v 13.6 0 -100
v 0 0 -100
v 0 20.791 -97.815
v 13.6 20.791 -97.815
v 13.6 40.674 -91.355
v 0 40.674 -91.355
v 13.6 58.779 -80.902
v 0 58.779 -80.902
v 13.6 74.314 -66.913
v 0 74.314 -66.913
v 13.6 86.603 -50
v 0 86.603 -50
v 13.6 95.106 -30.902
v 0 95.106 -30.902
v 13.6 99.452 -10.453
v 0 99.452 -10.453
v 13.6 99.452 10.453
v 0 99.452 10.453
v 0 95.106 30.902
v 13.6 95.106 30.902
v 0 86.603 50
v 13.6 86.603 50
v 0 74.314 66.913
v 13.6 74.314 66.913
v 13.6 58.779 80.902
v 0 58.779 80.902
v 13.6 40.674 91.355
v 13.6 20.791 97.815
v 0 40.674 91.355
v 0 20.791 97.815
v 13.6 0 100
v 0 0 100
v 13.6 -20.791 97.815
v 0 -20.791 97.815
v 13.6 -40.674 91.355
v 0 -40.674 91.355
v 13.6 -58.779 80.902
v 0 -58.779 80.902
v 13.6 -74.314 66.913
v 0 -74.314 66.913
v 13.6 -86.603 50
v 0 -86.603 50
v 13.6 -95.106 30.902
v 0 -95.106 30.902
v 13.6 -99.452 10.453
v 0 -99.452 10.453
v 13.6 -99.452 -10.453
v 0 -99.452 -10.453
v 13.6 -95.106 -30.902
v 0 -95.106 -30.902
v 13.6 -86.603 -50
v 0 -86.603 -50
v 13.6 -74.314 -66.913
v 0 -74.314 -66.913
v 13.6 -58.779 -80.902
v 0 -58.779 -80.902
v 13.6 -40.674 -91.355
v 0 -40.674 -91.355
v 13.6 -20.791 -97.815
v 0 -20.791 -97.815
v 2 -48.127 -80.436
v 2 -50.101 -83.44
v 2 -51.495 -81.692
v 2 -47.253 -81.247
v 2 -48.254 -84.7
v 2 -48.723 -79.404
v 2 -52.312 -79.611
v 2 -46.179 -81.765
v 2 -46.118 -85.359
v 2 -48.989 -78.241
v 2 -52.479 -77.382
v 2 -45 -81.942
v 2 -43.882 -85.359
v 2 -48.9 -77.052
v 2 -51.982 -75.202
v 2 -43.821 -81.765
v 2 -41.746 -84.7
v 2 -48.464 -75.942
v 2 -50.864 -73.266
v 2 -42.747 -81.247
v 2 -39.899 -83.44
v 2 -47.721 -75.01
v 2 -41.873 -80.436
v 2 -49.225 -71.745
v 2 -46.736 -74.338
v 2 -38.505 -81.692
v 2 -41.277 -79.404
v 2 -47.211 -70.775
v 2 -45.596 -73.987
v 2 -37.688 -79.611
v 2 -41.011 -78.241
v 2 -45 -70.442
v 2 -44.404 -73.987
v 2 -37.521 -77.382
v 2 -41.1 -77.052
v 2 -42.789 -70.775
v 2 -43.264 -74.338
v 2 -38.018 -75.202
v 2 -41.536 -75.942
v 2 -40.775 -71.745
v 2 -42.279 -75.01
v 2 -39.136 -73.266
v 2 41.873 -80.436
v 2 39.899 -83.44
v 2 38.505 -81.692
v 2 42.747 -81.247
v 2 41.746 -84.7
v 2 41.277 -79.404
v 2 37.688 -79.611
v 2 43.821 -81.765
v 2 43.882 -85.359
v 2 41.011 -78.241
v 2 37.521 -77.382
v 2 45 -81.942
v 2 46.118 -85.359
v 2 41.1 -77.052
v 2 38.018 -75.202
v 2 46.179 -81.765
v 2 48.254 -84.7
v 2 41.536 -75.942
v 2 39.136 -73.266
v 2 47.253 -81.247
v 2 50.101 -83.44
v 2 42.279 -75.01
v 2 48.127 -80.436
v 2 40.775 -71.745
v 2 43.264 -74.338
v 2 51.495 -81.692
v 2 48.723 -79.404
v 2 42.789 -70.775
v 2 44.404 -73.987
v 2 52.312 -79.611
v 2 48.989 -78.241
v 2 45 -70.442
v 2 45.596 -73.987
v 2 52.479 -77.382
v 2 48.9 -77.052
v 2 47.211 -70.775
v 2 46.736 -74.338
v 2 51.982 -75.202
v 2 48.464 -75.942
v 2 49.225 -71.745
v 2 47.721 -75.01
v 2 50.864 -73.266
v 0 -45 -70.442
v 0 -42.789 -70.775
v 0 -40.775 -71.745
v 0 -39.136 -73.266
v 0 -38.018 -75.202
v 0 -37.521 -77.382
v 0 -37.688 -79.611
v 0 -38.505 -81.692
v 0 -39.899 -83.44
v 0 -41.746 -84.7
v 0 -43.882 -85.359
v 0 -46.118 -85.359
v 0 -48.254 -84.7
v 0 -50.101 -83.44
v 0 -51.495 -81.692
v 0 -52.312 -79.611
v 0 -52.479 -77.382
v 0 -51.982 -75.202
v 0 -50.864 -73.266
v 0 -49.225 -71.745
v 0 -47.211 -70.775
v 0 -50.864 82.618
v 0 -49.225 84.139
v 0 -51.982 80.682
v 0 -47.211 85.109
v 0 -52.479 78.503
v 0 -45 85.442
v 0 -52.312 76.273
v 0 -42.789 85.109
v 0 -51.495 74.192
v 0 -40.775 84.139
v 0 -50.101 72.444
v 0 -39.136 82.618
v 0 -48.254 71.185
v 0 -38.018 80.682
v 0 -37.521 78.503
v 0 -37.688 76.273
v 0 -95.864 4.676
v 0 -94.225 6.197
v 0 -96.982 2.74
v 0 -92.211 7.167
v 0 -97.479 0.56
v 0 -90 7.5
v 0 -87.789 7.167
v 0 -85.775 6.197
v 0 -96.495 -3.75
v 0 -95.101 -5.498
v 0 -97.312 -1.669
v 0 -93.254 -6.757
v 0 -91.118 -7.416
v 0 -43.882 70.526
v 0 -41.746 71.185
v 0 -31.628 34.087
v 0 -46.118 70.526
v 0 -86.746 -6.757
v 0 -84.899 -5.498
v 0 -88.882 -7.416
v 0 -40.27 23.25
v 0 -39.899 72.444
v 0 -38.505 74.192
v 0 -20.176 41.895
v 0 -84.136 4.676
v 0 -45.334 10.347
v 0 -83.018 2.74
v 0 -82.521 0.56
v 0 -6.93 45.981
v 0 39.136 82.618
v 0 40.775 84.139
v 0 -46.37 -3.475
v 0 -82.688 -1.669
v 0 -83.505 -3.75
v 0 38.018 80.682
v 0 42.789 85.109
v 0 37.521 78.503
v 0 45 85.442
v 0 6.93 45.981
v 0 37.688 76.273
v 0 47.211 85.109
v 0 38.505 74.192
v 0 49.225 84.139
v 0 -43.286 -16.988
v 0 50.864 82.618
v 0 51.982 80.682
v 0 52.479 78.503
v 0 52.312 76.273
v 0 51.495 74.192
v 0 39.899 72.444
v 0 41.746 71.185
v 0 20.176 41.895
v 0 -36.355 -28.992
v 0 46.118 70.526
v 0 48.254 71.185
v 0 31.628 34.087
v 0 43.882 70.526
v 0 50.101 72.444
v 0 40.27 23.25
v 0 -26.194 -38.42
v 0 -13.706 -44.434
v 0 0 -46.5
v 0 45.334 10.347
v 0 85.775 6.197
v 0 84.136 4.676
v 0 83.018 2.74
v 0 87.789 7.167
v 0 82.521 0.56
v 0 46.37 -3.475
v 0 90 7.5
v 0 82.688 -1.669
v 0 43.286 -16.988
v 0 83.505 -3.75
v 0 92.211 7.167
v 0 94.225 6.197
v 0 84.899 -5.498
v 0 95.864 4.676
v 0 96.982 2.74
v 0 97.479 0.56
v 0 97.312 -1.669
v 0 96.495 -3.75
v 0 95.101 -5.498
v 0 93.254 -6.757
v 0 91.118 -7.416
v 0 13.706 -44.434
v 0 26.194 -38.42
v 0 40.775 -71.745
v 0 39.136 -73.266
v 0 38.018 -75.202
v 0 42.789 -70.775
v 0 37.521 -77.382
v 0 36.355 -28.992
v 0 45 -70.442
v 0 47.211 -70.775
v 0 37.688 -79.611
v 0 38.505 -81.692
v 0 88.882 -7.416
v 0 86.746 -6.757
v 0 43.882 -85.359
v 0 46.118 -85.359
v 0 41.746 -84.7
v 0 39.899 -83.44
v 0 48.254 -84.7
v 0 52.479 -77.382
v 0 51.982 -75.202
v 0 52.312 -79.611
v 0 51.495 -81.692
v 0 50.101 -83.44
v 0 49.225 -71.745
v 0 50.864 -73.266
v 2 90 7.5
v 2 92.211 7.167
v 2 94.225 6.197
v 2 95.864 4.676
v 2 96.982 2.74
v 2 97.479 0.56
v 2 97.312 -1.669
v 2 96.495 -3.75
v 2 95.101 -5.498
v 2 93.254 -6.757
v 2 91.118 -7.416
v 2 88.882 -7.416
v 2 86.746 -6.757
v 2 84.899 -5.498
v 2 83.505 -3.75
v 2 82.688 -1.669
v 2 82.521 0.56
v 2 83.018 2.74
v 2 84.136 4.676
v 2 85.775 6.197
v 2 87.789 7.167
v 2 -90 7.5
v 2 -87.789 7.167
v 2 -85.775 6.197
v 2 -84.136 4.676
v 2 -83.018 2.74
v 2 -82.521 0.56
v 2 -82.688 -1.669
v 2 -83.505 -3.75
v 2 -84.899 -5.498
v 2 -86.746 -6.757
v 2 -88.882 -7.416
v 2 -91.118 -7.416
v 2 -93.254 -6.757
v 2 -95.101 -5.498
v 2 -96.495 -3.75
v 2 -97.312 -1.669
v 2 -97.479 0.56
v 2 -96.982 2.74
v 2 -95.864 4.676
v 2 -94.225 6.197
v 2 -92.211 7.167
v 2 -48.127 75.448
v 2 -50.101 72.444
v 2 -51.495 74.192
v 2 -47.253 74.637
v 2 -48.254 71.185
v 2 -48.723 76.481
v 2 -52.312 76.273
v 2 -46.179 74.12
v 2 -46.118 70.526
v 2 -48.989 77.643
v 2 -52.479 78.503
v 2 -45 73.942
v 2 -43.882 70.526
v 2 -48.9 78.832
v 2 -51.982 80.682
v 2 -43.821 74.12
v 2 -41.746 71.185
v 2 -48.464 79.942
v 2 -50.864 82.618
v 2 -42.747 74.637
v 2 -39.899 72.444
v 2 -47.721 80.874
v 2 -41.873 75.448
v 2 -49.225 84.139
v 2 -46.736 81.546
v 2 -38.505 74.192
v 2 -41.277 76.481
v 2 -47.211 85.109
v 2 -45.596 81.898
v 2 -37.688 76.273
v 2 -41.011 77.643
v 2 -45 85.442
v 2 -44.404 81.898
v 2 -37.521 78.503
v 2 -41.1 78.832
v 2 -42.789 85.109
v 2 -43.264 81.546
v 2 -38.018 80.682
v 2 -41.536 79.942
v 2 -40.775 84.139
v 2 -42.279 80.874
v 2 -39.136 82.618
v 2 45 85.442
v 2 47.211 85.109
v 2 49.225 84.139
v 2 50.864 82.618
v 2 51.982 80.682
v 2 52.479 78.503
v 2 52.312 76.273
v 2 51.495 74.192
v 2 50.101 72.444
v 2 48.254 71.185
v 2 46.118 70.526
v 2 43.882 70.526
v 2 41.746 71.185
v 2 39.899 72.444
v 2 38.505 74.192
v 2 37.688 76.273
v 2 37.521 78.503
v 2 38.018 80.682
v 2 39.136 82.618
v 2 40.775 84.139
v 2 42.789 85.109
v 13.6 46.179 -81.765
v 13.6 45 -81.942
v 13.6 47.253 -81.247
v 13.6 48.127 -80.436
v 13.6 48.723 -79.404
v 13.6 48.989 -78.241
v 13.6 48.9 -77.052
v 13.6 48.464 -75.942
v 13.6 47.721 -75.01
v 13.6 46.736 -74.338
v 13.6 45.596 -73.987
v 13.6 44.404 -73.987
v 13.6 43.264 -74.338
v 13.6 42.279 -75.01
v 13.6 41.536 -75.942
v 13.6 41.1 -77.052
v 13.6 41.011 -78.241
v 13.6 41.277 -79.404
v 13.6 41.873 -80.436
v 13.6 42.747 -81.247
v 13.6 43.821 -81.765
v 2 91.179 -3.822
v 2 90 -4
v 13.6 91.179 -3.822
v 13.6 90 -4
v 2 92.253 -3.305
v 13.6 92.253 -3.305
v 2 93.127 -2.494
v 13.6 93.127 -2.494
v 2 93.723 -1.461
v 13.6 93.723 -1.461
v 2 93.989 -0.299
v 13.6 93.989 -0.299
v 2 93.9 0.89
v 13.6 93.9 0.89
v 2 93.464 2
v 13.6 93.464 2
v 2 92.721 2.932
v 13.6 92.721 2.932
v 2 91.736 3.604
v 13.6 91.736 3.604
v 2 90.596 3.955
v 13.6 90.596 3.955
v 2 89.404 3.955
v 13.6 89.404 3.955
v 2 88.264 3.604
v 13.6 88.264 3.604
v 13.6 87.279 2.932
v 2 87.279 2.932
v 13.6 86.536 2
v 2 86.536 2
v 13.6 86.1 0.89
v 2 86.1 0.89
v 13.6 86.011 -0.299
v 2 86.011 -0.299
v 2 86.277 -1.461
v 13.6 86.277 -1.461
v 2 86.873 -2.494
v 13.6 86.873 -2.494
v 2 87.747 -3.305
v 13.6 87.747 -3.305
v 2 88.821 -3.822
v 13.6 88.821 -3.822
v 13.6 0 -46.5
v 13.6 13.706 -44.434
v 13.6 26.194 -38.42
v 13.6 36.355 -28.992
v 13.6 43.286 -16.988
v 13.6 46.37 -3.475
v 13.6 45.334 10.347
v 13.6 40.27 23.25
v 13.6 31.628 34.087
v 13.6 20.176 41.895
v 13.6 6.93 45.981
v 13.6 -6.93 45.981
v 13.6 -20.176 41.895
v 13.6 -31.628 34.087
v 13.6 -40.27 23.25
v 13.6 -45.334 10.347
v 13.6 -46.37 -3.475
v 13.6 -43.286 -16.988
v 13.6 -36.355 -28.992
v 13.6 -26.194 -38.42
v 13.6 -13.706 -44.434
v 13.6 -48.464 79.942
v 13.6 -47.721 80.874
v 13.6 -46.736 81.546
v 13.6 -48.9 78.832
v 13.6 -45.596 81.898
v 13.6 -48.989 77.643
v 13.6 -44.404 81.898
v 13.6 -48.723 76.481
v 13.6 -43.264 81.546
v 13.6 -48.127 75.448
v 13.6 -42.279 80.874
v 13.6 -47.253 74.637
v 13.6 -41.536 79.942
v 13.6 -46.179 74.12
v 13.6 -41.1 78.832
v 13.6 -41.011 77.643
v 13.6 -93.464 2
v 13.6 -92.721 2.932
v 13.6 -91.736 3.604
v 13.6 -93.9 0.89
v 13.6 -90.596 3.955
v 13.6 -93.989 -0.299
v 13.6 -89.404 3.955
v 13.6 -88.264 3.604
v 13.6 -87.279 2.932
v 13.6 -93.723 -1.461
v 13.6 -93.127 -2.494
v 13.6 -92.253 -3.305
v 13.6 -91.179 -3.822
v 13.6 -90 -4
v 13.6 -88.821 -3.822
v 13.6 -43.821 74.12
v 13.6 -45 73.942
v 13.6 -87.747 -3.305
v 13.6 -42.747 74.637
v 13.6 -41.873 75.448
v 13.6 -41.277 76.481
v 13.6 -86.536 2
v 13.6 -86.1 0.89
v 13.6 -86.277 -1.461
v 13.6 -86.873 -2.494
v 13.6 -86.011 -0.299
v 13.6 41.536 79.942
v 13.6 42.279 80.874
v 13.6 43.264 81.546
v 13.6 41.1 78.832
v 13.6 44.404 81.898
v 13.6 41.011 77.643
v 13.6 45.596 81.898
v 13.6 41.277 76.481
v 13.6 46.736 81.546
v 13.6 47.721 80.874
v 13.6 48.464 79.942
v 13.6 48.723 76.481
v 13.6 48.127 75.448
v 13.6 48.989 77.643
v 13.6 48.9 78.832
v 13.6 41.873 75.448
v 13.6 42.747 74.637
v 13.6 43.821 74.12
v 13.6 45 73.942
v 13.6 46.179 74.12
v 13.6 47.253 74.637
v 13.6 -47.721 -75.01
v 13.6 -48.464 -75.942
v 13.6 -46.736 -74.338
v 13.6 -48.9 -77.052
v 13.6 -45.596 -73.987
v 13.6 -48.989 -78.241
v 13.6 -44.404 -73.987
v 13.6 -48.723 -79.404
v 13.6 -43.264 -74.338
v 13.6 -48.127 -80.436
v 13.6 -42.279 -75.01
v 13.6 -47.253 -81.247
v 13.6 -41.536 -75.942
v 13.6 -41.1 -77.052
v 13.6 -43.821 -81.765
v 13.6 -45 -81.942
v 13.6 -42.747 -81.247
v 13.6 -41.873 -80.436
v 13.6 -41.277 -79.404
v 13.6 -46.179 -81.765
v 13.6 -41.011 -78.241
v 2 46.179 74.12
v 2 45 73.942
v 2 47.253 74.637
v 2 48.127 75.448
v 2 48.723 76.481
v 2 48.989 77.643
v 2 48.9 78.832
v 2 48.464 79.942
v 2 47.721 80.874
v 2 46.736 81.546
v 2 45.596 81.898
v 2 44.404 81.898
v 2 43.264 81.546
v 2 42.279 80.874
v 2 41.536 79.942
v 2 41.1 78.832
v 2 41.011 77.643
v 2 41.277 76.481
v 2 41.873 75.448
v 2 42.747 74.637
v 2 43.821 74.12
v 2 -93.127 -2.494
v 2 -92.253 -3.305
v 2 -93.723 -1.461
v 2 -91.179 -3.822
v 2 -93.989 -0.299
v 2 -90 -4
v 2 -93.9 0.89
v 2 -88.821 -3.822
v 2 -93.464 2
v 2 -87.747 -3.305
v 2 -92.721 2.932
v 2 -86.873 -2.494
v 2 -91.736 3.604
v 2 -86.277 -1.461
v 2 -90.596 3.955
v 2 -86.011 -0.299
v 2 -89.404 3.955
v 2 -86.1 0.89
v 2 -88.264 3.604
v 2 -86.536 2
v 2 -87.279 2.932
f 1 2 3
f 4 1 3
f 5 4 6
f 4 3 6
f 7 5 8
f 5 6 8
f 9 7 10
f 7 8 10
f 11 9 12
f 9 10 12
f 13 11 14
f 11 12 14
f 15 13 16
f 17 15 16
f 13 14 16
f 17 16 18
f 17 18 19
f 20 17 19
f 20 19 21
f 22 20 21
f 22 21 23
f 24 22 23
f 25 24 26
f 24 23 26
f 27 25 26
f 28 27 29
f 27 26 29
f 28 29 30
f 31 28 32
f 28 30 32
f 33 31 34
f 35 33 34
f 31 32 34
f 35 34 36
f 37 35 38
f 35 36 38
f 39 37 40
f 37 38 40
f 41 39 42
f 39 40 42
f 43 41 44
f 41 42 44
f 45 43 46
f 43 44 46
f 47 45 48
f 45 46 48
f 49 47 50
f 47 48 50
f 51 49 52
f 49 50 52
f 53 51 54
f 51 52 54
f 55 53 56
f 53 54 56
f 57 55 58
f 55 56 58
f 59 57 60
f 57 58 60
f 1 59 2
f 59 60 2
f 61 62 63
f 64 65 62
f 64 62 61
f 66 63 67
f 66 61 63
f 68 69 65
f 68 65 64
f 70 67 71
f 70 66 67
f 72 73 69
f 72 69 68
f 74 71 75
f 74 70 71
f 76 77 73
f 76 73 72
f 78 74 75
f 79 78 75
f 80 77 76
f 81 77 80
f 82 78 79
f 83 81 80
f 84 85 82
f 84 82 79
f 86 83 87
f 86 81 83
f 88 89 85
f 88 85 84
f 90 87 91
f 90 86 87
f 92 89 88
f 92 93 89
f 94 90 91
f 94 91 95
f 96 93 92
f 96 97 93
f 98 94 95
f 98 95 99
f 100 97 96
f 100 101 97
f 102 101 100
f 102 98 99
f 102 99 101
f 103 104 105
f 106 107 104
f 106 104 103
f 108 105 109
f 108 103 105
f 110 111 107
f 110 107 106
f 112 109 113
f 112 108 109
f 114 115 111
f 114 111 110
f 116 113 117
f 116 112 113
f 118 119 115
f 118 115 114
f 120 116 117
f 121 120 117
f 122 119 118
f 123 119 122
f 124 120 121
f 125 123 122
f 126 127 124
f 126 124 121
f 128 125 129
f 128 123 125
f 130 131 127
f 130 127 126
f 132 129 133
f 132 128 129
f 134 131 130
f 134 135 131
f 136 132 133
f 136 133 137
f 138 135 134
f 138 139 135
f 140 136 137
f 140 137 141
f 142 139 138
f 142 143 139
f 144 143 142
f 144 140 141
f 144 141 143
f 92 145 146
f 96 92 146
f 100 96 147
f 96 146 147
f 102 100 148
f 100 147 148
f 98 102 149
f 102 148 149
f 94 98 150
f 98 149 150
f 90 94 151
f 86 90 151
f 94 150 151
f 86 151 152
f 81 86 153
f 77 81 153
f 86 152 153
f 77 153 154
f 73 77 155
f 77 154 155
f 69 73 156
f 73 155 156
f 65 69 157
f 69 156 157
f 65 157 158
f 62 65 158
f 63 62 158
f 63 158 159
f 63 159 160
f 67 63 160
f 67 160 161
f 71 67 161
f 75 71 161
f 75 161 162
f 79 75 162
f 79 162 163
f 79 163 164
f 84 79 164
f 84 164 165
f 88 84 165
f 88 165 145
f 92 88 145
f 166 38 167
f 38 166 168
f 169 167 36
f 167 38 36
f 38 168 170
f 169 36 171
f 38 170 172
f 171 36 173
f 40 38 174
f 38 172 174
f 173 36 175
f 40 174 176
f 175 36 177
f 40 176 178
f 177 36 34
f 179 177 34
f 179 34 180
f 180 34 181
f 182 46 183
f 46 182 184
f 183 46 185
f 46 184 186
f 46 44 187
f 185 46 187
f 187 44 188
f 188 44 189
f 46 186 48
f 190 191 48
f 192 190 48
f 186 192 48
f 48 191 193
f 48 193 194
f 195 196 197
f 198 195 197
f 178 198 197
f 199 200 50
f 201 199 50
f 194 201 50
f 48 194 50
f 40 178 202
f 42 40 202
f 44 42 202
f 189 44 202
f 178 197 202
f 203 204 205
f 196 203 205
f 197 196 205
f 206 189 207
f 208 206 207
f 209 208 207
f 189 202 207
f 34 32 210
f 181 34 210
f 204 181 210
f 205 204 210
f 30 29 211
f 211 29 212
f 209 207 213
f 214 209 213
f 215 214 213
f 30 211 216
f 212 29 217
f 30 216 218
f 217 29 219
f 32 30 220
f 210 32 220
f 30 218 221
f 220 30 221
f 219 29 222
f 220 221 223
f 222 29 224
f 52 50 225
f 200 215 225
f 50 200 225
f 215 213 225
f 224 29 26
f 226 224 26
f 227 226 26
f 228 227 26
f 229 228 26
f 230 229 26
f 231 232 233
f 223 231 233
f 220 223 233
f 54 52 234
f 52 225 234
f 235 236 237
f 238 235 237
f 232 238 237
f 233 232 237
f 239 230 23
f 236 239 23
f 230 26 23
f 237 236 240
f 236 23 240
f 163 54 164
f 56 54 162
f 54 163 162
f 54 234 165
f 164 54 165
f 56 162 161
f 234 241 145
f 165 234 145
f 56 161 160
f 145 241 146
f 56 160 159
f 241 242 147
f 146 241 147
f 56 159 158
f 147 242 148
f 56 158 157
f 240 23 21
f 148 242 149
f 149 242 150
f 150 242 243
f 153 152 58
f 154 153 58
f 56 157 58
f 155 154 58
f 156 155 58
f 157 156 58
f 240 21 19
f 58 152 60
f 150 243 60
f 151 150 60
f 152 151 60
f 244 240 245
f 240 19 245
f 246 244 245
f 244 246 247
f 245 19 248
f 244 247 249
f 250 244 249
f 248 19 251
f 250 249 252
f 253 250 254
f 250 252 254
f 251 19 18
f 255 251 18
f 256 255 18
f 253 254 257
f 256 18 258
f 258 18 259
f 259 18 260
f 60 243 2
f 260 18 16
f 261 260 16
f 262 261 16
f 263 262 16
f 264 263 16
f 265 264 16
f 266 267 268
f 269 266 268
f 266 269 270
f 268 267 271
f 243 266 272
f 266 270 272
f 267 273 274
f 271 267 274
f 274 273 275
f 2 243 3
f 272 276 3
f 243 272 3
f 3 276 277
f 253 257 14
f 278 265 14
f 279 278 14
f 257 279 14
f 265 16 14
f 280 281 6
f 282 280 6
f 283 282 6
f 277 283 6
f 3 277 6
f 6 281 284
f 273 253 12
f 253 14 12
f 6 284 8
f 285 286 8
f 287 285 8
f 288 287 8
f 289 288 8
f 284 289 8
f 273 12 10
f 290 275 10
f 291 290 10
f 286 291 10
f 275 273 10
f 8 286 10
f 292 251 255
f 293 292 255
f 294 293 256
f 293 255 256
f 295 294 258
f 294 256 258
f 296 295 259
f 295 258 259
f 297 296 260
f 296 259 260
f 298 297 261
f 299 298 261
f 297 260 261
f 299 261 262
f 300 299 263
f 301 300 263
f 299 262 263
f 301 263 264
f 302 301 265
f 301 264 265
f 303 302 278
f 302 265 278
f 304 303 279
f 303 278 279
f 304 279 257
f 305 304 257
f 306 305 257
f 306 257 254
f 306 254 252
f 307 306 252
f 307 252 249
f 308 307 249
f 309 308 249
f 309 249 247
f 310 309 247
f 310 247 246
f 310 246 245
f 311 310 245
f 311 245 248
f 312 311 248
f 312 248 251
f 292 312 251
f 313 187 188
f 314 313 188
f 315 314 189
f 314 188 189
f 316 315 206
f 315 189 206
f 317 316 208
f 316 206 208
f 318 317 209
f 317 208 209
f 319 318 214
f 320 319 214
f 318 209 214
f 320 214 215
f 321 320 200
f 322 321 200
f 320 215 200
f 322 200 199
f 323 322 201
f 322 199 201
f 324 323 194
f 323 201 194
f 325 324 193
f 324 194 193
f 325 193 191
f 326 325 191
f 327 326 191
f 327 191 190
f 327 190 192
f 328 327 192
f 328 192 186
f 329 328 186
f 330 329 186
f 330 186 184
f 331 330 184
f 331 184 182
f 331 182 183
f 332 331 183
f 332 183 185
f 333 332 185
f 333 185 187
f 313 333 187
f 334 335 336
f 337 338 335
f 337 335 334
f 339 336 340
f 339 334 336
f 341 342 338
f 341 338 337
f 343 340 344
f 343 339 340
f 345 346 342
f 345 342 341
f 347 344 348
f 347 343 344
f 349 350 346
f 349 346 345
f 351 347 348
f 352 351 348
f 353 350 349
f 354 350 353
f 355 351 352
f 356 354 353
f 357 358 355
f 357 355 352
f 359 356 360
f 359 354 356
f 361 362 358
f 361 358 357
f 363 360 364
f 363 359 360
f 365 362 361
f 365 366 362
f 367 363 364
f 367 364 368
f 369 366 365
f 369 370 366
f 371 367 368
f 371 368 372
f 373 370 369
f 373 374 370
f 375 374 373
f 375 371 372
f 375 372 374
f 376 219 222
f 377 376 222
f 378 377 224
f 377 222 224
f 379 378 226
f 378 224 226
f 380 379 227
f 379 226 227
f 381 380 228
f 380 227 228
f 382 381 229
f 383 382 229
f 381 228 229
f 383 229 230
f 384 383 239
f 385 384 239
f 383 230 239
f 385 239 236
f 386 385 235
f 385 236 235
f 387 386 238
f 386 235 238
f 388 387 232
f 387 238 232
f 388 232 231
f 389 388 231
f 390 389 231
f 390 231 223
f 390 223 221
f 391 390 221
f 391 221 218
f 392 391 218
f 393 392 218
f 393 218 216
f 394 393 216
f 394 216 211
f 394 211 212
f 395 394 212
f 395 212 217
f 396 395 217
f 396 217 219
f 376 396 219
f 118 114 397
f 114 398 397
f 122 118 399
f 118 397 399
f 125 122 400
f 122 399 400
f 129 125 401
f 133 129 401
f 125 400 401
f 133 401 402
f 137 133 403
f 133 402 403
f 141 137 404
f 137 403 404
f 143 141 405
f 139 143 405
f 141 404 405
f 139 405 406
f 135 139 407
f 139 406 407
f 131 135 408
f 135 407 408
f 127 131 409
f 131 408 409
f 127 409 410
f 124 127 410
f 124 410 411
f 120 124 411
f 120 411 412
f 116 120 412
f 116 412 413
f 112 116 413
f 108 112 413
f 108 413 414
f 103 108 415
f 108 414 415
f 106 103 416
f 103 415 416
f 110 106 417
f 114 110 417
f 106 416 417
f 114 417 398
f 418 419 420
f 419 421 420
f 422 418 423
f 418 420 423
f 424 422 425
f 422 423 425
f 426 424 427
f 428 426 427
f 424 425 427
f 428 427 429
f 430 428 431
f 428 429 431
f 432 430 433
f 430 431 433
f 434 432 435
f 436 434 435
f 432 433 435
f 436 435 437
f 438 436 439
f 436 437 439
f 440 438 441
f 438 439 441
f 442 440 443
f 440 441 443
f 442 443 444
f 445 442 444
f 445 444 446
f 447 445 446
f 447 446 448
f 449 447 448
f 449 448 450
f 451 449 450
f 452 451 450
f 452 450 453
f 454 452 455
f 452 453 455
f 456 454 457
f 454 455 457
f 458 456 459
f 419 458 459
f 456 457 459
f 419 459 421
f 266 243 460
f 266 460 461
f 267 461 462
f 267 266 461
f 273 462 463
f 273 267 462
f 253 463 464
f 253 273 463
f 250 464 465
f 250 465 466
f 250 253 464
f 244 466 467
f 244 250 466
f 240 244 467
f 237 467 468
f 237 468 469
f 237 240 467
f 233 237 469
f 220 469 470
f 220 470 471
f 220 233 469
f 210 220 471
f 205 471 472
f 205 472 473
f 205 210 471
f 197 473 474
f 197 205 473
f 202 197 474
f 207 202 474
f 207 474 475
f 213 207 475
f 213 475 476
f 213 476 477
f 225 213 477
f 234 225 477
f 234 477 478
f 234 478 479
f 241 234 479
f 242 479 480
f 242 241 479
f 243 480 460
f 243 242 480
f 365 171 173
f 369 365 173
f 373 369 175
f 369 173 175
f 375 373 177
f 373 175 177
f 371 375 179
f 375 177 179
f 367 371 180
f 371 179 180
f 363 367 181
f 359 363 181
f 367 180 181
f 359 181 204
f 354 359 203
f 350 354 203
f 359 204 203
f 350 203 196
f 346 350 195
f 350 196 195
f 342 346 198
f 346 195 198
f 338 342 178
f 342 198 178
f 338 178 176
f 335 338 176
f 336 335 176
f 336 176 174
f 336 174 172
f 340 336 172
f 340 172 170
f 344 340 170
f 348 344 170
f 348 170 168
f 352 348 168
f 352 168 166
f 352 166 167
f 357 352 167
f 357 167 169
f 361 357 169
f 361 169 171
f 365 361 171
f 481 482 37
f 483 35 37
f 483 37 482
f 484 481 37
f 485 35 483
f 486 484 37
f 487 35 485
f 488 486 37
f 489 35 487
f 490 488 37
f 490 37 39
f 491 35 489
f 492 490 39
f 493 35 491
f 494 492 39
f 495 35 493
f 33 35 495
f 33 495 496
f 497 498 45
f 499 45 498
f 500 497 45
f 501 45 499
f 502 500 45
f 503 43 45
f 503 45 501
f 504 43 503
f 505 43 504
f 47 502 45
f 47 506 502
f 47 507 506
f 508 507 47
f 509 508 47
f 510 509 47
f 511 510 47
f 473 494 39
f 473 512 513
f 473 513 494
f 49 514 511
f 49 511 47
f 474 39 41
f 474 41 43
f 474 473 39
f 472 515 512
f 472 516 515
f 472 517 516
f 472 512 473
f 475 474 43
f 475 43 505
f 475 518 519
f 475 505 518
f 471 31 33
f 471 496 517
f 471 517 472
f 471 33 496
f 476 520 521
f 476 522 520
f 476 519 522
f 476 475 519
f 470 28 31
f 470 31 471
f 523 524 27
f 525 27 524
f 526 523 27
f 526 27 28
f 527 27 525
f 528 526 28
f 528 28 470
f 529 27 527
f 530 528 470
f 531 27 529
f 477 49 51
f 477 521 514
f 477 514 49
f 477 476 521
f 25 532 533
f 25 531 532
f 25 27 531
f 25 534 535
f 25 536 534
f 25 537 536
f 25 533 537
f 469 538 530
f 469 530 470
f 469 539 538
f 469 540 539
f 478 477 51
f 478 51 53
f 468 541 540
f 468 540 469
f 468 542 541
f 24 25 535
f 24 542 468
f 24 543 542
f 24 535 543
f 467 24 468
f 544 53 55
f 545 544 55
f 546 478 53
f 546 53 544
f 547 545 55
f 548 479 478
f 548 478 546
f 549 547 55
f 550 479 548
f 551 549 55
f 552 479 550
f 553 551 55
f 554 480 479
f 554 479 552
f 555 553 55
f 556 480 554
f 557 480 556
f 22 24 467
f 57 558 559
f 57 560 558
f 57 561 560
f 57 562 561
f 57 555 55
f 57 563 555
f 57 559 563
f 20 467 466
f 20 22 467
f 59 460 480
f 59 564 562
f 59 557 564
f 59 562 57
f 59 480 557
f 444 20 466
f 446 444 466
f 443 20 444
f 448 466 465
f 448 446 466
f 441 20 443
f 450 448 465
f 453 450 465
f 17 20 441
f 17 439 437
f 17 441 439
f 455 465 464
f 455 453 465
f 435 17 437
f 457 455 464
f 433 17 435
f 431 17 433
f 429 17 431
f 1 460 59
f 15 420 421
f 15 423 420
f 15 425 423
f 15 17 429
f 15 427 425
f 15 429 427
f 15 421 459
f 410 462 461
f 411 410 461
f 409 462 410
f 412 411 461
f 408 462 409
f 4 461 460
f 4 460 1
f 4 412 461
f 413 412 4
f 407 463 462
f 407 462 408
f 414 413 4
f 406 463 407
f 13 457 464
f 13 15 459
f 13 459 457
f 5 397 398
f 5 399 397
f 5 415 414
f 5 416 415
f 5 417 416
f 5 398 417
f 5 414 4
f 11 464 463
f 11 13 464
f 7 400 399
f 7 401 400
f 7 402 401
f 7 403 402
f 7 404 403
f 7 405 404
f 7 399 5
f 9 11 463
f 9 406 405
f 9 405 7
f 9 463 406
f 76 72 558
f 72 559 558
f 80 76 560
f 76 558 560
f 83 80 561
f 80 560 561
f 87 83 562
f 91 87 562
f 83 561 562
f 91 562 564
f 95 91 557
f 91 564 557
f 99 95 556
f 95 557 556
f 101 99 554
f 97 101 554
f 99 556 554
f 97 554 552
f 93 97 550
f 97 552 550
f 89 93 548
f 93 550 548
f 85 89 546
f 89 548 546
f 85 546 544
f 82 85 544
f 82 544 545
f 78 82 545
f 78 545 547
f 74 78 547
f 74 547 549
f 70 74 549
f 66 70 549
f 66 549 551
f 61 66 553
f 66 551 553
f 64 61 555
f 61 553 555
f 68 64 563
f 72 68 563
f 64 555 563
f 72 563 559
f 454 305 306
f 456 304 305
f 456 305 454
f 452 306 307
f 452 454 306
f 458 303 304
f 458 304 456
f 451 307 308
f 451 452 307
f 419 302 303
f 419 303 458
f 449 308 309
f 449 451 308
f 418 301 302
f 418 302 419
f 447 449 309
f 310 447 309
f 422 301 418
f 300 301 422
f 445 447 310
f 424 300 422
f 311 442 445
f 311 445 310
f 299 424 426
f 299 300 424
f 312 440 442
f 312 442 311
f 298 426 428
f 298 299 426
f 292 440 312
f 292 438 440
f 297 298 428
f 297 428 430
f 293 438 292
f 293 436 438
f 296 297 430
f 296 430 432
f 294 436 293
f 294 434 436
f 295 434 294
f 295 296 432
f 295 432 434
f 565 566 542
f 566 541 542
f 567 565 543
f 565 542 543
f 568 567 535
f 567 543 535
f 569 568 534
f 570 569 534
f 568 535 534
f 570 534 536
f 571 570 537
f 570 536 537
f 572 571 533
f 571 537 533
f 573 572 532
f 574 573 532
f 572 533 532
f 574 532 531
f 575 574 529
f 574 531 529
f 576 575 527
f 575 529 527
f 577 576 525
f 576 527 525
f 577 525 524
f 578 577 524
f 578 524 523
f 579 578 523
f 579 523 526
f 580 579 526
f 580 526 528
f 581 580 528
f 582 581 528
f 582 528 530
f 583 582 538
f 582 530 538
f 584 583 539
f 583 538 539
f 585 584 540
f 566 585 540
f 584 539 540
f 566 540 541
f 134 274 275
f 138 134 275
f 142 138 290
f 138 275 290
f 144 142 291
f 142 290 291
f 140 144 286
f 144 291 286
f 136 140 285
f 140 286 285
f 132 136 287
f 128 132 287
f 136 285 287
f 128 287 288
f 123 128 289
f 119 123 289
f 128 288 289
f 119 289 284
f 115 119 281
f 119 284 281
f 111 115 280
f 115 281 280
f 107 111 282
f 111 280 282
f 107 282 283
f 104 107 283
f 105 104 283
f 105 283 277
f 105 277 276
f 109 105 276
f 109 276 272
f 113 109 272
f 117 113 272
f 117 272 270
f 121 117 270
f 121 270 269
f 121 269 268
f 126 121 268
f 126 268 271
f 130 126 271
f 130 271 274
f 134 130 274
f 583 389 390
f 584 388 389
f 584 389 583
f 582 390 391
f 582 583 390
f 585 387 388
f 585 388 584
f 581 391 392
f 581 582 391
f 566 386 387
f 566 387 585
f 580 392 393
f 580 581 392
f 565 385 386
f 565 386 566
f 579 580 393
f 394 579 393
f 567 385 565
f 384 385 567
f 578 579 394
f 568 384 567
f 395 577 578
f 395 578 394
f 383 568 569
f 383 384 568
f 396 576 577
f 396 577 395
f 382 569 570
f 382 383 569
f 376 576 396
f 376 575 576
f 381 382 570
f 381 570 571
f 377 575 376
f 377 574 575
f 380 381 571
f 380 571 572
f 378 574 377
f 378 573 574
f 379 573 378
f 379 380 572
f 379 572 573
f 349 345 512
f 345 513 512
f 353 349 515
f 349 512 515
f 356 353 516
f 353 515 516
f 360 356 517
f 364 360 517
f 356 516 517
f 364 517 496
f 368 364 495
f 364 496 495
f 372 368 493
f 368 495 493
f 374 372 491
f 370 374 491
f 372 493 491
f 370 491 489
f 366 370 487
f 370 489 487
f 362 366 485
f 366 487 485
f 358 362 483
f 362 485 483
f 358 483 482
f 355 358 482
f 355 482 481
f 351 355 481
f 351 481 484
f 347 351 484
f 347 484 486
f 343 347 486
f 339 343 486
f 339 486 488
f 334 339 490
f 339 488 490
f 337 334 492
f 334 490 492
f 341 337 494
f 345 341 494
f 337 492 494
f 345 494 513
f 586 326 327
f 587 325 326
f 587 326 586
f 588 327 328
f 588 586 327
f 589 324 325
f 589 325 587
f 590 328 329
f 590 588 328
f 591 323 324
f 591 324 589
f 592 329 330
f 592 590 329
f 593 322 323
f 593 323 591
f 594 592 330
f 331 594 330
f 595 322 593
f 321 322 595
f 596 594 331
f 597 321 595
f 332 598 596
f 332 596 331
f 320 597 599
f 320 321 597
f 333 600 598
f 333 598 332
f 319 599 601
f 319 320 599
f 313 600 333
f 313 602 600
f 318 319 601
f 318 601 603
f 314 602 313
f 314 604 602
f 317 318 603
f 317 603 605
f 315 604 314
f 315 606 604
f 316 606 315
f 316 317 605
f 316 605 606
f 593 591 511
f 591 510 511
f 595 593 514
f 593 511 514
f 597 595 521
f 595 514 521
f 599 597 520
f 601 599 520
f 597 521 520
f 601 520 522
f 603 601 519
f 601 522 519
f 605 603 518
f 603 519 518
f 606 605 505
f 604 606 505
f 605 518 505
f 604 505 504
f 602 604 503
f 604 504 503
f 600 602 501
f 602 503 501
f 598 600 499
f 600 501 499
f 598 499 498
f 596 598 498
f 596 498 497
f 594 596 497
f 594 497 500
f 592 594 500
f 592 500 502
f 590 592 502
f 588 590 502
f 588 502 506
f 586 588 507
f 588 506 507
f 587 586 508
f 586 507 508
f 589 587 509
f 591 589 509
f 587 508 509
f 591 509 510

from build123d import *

# Parameters (mm, degrees)
SKETCH1_R           = 100
SKETCH1_R_2         = 46.5
BOSS_EXTRUDE1_DEPTH = 13.6
HOLE1_D             = 8
HOLE1_DEPTH         = 15
HOLE1_CBORE_D       = 15
HOLE1_CBORE_DEPTH   = 2
HOLE1_TIP           = 2.403442476


with BuildPart() as part:
    # Sketch1 → Boss-Extrude1 (new body)
    with BuildSketch(Plane(origin=(0, 0, 0), x_dir=(0, 0, -1), z_dir=(1, 0, 0))):
        Circle(SKETCH1_R)
        Circle(SKETCH1_R_2, mode=Mode.SUBTRACT)
    extrude(amount=BOSS_EXTRUDE1_DEPTH)

    # Hole1
    with Locations(Plane.ZY):
        with Locations((-77.942286341, 45), (0, 90), (77.942286341, 45), (77.942286341, -45), (0, -90), (-77.942286341, -45)):
            CounterBoreHole(HOLE1_D / 2, HOLE1_CBORE_D / 2, HOLE1_CBORE_DEPTH, depth=HOLE1_DEPTH)
            with Locations((0, 0, -(HOLE1_DEPTH + HOLE1_TIP / 2))):  # 118° drill point
                Cone(0, HOLE1_D / 2, HOLE1_TIP, mode=Mode.SUBTRACT)


solid = part.part
